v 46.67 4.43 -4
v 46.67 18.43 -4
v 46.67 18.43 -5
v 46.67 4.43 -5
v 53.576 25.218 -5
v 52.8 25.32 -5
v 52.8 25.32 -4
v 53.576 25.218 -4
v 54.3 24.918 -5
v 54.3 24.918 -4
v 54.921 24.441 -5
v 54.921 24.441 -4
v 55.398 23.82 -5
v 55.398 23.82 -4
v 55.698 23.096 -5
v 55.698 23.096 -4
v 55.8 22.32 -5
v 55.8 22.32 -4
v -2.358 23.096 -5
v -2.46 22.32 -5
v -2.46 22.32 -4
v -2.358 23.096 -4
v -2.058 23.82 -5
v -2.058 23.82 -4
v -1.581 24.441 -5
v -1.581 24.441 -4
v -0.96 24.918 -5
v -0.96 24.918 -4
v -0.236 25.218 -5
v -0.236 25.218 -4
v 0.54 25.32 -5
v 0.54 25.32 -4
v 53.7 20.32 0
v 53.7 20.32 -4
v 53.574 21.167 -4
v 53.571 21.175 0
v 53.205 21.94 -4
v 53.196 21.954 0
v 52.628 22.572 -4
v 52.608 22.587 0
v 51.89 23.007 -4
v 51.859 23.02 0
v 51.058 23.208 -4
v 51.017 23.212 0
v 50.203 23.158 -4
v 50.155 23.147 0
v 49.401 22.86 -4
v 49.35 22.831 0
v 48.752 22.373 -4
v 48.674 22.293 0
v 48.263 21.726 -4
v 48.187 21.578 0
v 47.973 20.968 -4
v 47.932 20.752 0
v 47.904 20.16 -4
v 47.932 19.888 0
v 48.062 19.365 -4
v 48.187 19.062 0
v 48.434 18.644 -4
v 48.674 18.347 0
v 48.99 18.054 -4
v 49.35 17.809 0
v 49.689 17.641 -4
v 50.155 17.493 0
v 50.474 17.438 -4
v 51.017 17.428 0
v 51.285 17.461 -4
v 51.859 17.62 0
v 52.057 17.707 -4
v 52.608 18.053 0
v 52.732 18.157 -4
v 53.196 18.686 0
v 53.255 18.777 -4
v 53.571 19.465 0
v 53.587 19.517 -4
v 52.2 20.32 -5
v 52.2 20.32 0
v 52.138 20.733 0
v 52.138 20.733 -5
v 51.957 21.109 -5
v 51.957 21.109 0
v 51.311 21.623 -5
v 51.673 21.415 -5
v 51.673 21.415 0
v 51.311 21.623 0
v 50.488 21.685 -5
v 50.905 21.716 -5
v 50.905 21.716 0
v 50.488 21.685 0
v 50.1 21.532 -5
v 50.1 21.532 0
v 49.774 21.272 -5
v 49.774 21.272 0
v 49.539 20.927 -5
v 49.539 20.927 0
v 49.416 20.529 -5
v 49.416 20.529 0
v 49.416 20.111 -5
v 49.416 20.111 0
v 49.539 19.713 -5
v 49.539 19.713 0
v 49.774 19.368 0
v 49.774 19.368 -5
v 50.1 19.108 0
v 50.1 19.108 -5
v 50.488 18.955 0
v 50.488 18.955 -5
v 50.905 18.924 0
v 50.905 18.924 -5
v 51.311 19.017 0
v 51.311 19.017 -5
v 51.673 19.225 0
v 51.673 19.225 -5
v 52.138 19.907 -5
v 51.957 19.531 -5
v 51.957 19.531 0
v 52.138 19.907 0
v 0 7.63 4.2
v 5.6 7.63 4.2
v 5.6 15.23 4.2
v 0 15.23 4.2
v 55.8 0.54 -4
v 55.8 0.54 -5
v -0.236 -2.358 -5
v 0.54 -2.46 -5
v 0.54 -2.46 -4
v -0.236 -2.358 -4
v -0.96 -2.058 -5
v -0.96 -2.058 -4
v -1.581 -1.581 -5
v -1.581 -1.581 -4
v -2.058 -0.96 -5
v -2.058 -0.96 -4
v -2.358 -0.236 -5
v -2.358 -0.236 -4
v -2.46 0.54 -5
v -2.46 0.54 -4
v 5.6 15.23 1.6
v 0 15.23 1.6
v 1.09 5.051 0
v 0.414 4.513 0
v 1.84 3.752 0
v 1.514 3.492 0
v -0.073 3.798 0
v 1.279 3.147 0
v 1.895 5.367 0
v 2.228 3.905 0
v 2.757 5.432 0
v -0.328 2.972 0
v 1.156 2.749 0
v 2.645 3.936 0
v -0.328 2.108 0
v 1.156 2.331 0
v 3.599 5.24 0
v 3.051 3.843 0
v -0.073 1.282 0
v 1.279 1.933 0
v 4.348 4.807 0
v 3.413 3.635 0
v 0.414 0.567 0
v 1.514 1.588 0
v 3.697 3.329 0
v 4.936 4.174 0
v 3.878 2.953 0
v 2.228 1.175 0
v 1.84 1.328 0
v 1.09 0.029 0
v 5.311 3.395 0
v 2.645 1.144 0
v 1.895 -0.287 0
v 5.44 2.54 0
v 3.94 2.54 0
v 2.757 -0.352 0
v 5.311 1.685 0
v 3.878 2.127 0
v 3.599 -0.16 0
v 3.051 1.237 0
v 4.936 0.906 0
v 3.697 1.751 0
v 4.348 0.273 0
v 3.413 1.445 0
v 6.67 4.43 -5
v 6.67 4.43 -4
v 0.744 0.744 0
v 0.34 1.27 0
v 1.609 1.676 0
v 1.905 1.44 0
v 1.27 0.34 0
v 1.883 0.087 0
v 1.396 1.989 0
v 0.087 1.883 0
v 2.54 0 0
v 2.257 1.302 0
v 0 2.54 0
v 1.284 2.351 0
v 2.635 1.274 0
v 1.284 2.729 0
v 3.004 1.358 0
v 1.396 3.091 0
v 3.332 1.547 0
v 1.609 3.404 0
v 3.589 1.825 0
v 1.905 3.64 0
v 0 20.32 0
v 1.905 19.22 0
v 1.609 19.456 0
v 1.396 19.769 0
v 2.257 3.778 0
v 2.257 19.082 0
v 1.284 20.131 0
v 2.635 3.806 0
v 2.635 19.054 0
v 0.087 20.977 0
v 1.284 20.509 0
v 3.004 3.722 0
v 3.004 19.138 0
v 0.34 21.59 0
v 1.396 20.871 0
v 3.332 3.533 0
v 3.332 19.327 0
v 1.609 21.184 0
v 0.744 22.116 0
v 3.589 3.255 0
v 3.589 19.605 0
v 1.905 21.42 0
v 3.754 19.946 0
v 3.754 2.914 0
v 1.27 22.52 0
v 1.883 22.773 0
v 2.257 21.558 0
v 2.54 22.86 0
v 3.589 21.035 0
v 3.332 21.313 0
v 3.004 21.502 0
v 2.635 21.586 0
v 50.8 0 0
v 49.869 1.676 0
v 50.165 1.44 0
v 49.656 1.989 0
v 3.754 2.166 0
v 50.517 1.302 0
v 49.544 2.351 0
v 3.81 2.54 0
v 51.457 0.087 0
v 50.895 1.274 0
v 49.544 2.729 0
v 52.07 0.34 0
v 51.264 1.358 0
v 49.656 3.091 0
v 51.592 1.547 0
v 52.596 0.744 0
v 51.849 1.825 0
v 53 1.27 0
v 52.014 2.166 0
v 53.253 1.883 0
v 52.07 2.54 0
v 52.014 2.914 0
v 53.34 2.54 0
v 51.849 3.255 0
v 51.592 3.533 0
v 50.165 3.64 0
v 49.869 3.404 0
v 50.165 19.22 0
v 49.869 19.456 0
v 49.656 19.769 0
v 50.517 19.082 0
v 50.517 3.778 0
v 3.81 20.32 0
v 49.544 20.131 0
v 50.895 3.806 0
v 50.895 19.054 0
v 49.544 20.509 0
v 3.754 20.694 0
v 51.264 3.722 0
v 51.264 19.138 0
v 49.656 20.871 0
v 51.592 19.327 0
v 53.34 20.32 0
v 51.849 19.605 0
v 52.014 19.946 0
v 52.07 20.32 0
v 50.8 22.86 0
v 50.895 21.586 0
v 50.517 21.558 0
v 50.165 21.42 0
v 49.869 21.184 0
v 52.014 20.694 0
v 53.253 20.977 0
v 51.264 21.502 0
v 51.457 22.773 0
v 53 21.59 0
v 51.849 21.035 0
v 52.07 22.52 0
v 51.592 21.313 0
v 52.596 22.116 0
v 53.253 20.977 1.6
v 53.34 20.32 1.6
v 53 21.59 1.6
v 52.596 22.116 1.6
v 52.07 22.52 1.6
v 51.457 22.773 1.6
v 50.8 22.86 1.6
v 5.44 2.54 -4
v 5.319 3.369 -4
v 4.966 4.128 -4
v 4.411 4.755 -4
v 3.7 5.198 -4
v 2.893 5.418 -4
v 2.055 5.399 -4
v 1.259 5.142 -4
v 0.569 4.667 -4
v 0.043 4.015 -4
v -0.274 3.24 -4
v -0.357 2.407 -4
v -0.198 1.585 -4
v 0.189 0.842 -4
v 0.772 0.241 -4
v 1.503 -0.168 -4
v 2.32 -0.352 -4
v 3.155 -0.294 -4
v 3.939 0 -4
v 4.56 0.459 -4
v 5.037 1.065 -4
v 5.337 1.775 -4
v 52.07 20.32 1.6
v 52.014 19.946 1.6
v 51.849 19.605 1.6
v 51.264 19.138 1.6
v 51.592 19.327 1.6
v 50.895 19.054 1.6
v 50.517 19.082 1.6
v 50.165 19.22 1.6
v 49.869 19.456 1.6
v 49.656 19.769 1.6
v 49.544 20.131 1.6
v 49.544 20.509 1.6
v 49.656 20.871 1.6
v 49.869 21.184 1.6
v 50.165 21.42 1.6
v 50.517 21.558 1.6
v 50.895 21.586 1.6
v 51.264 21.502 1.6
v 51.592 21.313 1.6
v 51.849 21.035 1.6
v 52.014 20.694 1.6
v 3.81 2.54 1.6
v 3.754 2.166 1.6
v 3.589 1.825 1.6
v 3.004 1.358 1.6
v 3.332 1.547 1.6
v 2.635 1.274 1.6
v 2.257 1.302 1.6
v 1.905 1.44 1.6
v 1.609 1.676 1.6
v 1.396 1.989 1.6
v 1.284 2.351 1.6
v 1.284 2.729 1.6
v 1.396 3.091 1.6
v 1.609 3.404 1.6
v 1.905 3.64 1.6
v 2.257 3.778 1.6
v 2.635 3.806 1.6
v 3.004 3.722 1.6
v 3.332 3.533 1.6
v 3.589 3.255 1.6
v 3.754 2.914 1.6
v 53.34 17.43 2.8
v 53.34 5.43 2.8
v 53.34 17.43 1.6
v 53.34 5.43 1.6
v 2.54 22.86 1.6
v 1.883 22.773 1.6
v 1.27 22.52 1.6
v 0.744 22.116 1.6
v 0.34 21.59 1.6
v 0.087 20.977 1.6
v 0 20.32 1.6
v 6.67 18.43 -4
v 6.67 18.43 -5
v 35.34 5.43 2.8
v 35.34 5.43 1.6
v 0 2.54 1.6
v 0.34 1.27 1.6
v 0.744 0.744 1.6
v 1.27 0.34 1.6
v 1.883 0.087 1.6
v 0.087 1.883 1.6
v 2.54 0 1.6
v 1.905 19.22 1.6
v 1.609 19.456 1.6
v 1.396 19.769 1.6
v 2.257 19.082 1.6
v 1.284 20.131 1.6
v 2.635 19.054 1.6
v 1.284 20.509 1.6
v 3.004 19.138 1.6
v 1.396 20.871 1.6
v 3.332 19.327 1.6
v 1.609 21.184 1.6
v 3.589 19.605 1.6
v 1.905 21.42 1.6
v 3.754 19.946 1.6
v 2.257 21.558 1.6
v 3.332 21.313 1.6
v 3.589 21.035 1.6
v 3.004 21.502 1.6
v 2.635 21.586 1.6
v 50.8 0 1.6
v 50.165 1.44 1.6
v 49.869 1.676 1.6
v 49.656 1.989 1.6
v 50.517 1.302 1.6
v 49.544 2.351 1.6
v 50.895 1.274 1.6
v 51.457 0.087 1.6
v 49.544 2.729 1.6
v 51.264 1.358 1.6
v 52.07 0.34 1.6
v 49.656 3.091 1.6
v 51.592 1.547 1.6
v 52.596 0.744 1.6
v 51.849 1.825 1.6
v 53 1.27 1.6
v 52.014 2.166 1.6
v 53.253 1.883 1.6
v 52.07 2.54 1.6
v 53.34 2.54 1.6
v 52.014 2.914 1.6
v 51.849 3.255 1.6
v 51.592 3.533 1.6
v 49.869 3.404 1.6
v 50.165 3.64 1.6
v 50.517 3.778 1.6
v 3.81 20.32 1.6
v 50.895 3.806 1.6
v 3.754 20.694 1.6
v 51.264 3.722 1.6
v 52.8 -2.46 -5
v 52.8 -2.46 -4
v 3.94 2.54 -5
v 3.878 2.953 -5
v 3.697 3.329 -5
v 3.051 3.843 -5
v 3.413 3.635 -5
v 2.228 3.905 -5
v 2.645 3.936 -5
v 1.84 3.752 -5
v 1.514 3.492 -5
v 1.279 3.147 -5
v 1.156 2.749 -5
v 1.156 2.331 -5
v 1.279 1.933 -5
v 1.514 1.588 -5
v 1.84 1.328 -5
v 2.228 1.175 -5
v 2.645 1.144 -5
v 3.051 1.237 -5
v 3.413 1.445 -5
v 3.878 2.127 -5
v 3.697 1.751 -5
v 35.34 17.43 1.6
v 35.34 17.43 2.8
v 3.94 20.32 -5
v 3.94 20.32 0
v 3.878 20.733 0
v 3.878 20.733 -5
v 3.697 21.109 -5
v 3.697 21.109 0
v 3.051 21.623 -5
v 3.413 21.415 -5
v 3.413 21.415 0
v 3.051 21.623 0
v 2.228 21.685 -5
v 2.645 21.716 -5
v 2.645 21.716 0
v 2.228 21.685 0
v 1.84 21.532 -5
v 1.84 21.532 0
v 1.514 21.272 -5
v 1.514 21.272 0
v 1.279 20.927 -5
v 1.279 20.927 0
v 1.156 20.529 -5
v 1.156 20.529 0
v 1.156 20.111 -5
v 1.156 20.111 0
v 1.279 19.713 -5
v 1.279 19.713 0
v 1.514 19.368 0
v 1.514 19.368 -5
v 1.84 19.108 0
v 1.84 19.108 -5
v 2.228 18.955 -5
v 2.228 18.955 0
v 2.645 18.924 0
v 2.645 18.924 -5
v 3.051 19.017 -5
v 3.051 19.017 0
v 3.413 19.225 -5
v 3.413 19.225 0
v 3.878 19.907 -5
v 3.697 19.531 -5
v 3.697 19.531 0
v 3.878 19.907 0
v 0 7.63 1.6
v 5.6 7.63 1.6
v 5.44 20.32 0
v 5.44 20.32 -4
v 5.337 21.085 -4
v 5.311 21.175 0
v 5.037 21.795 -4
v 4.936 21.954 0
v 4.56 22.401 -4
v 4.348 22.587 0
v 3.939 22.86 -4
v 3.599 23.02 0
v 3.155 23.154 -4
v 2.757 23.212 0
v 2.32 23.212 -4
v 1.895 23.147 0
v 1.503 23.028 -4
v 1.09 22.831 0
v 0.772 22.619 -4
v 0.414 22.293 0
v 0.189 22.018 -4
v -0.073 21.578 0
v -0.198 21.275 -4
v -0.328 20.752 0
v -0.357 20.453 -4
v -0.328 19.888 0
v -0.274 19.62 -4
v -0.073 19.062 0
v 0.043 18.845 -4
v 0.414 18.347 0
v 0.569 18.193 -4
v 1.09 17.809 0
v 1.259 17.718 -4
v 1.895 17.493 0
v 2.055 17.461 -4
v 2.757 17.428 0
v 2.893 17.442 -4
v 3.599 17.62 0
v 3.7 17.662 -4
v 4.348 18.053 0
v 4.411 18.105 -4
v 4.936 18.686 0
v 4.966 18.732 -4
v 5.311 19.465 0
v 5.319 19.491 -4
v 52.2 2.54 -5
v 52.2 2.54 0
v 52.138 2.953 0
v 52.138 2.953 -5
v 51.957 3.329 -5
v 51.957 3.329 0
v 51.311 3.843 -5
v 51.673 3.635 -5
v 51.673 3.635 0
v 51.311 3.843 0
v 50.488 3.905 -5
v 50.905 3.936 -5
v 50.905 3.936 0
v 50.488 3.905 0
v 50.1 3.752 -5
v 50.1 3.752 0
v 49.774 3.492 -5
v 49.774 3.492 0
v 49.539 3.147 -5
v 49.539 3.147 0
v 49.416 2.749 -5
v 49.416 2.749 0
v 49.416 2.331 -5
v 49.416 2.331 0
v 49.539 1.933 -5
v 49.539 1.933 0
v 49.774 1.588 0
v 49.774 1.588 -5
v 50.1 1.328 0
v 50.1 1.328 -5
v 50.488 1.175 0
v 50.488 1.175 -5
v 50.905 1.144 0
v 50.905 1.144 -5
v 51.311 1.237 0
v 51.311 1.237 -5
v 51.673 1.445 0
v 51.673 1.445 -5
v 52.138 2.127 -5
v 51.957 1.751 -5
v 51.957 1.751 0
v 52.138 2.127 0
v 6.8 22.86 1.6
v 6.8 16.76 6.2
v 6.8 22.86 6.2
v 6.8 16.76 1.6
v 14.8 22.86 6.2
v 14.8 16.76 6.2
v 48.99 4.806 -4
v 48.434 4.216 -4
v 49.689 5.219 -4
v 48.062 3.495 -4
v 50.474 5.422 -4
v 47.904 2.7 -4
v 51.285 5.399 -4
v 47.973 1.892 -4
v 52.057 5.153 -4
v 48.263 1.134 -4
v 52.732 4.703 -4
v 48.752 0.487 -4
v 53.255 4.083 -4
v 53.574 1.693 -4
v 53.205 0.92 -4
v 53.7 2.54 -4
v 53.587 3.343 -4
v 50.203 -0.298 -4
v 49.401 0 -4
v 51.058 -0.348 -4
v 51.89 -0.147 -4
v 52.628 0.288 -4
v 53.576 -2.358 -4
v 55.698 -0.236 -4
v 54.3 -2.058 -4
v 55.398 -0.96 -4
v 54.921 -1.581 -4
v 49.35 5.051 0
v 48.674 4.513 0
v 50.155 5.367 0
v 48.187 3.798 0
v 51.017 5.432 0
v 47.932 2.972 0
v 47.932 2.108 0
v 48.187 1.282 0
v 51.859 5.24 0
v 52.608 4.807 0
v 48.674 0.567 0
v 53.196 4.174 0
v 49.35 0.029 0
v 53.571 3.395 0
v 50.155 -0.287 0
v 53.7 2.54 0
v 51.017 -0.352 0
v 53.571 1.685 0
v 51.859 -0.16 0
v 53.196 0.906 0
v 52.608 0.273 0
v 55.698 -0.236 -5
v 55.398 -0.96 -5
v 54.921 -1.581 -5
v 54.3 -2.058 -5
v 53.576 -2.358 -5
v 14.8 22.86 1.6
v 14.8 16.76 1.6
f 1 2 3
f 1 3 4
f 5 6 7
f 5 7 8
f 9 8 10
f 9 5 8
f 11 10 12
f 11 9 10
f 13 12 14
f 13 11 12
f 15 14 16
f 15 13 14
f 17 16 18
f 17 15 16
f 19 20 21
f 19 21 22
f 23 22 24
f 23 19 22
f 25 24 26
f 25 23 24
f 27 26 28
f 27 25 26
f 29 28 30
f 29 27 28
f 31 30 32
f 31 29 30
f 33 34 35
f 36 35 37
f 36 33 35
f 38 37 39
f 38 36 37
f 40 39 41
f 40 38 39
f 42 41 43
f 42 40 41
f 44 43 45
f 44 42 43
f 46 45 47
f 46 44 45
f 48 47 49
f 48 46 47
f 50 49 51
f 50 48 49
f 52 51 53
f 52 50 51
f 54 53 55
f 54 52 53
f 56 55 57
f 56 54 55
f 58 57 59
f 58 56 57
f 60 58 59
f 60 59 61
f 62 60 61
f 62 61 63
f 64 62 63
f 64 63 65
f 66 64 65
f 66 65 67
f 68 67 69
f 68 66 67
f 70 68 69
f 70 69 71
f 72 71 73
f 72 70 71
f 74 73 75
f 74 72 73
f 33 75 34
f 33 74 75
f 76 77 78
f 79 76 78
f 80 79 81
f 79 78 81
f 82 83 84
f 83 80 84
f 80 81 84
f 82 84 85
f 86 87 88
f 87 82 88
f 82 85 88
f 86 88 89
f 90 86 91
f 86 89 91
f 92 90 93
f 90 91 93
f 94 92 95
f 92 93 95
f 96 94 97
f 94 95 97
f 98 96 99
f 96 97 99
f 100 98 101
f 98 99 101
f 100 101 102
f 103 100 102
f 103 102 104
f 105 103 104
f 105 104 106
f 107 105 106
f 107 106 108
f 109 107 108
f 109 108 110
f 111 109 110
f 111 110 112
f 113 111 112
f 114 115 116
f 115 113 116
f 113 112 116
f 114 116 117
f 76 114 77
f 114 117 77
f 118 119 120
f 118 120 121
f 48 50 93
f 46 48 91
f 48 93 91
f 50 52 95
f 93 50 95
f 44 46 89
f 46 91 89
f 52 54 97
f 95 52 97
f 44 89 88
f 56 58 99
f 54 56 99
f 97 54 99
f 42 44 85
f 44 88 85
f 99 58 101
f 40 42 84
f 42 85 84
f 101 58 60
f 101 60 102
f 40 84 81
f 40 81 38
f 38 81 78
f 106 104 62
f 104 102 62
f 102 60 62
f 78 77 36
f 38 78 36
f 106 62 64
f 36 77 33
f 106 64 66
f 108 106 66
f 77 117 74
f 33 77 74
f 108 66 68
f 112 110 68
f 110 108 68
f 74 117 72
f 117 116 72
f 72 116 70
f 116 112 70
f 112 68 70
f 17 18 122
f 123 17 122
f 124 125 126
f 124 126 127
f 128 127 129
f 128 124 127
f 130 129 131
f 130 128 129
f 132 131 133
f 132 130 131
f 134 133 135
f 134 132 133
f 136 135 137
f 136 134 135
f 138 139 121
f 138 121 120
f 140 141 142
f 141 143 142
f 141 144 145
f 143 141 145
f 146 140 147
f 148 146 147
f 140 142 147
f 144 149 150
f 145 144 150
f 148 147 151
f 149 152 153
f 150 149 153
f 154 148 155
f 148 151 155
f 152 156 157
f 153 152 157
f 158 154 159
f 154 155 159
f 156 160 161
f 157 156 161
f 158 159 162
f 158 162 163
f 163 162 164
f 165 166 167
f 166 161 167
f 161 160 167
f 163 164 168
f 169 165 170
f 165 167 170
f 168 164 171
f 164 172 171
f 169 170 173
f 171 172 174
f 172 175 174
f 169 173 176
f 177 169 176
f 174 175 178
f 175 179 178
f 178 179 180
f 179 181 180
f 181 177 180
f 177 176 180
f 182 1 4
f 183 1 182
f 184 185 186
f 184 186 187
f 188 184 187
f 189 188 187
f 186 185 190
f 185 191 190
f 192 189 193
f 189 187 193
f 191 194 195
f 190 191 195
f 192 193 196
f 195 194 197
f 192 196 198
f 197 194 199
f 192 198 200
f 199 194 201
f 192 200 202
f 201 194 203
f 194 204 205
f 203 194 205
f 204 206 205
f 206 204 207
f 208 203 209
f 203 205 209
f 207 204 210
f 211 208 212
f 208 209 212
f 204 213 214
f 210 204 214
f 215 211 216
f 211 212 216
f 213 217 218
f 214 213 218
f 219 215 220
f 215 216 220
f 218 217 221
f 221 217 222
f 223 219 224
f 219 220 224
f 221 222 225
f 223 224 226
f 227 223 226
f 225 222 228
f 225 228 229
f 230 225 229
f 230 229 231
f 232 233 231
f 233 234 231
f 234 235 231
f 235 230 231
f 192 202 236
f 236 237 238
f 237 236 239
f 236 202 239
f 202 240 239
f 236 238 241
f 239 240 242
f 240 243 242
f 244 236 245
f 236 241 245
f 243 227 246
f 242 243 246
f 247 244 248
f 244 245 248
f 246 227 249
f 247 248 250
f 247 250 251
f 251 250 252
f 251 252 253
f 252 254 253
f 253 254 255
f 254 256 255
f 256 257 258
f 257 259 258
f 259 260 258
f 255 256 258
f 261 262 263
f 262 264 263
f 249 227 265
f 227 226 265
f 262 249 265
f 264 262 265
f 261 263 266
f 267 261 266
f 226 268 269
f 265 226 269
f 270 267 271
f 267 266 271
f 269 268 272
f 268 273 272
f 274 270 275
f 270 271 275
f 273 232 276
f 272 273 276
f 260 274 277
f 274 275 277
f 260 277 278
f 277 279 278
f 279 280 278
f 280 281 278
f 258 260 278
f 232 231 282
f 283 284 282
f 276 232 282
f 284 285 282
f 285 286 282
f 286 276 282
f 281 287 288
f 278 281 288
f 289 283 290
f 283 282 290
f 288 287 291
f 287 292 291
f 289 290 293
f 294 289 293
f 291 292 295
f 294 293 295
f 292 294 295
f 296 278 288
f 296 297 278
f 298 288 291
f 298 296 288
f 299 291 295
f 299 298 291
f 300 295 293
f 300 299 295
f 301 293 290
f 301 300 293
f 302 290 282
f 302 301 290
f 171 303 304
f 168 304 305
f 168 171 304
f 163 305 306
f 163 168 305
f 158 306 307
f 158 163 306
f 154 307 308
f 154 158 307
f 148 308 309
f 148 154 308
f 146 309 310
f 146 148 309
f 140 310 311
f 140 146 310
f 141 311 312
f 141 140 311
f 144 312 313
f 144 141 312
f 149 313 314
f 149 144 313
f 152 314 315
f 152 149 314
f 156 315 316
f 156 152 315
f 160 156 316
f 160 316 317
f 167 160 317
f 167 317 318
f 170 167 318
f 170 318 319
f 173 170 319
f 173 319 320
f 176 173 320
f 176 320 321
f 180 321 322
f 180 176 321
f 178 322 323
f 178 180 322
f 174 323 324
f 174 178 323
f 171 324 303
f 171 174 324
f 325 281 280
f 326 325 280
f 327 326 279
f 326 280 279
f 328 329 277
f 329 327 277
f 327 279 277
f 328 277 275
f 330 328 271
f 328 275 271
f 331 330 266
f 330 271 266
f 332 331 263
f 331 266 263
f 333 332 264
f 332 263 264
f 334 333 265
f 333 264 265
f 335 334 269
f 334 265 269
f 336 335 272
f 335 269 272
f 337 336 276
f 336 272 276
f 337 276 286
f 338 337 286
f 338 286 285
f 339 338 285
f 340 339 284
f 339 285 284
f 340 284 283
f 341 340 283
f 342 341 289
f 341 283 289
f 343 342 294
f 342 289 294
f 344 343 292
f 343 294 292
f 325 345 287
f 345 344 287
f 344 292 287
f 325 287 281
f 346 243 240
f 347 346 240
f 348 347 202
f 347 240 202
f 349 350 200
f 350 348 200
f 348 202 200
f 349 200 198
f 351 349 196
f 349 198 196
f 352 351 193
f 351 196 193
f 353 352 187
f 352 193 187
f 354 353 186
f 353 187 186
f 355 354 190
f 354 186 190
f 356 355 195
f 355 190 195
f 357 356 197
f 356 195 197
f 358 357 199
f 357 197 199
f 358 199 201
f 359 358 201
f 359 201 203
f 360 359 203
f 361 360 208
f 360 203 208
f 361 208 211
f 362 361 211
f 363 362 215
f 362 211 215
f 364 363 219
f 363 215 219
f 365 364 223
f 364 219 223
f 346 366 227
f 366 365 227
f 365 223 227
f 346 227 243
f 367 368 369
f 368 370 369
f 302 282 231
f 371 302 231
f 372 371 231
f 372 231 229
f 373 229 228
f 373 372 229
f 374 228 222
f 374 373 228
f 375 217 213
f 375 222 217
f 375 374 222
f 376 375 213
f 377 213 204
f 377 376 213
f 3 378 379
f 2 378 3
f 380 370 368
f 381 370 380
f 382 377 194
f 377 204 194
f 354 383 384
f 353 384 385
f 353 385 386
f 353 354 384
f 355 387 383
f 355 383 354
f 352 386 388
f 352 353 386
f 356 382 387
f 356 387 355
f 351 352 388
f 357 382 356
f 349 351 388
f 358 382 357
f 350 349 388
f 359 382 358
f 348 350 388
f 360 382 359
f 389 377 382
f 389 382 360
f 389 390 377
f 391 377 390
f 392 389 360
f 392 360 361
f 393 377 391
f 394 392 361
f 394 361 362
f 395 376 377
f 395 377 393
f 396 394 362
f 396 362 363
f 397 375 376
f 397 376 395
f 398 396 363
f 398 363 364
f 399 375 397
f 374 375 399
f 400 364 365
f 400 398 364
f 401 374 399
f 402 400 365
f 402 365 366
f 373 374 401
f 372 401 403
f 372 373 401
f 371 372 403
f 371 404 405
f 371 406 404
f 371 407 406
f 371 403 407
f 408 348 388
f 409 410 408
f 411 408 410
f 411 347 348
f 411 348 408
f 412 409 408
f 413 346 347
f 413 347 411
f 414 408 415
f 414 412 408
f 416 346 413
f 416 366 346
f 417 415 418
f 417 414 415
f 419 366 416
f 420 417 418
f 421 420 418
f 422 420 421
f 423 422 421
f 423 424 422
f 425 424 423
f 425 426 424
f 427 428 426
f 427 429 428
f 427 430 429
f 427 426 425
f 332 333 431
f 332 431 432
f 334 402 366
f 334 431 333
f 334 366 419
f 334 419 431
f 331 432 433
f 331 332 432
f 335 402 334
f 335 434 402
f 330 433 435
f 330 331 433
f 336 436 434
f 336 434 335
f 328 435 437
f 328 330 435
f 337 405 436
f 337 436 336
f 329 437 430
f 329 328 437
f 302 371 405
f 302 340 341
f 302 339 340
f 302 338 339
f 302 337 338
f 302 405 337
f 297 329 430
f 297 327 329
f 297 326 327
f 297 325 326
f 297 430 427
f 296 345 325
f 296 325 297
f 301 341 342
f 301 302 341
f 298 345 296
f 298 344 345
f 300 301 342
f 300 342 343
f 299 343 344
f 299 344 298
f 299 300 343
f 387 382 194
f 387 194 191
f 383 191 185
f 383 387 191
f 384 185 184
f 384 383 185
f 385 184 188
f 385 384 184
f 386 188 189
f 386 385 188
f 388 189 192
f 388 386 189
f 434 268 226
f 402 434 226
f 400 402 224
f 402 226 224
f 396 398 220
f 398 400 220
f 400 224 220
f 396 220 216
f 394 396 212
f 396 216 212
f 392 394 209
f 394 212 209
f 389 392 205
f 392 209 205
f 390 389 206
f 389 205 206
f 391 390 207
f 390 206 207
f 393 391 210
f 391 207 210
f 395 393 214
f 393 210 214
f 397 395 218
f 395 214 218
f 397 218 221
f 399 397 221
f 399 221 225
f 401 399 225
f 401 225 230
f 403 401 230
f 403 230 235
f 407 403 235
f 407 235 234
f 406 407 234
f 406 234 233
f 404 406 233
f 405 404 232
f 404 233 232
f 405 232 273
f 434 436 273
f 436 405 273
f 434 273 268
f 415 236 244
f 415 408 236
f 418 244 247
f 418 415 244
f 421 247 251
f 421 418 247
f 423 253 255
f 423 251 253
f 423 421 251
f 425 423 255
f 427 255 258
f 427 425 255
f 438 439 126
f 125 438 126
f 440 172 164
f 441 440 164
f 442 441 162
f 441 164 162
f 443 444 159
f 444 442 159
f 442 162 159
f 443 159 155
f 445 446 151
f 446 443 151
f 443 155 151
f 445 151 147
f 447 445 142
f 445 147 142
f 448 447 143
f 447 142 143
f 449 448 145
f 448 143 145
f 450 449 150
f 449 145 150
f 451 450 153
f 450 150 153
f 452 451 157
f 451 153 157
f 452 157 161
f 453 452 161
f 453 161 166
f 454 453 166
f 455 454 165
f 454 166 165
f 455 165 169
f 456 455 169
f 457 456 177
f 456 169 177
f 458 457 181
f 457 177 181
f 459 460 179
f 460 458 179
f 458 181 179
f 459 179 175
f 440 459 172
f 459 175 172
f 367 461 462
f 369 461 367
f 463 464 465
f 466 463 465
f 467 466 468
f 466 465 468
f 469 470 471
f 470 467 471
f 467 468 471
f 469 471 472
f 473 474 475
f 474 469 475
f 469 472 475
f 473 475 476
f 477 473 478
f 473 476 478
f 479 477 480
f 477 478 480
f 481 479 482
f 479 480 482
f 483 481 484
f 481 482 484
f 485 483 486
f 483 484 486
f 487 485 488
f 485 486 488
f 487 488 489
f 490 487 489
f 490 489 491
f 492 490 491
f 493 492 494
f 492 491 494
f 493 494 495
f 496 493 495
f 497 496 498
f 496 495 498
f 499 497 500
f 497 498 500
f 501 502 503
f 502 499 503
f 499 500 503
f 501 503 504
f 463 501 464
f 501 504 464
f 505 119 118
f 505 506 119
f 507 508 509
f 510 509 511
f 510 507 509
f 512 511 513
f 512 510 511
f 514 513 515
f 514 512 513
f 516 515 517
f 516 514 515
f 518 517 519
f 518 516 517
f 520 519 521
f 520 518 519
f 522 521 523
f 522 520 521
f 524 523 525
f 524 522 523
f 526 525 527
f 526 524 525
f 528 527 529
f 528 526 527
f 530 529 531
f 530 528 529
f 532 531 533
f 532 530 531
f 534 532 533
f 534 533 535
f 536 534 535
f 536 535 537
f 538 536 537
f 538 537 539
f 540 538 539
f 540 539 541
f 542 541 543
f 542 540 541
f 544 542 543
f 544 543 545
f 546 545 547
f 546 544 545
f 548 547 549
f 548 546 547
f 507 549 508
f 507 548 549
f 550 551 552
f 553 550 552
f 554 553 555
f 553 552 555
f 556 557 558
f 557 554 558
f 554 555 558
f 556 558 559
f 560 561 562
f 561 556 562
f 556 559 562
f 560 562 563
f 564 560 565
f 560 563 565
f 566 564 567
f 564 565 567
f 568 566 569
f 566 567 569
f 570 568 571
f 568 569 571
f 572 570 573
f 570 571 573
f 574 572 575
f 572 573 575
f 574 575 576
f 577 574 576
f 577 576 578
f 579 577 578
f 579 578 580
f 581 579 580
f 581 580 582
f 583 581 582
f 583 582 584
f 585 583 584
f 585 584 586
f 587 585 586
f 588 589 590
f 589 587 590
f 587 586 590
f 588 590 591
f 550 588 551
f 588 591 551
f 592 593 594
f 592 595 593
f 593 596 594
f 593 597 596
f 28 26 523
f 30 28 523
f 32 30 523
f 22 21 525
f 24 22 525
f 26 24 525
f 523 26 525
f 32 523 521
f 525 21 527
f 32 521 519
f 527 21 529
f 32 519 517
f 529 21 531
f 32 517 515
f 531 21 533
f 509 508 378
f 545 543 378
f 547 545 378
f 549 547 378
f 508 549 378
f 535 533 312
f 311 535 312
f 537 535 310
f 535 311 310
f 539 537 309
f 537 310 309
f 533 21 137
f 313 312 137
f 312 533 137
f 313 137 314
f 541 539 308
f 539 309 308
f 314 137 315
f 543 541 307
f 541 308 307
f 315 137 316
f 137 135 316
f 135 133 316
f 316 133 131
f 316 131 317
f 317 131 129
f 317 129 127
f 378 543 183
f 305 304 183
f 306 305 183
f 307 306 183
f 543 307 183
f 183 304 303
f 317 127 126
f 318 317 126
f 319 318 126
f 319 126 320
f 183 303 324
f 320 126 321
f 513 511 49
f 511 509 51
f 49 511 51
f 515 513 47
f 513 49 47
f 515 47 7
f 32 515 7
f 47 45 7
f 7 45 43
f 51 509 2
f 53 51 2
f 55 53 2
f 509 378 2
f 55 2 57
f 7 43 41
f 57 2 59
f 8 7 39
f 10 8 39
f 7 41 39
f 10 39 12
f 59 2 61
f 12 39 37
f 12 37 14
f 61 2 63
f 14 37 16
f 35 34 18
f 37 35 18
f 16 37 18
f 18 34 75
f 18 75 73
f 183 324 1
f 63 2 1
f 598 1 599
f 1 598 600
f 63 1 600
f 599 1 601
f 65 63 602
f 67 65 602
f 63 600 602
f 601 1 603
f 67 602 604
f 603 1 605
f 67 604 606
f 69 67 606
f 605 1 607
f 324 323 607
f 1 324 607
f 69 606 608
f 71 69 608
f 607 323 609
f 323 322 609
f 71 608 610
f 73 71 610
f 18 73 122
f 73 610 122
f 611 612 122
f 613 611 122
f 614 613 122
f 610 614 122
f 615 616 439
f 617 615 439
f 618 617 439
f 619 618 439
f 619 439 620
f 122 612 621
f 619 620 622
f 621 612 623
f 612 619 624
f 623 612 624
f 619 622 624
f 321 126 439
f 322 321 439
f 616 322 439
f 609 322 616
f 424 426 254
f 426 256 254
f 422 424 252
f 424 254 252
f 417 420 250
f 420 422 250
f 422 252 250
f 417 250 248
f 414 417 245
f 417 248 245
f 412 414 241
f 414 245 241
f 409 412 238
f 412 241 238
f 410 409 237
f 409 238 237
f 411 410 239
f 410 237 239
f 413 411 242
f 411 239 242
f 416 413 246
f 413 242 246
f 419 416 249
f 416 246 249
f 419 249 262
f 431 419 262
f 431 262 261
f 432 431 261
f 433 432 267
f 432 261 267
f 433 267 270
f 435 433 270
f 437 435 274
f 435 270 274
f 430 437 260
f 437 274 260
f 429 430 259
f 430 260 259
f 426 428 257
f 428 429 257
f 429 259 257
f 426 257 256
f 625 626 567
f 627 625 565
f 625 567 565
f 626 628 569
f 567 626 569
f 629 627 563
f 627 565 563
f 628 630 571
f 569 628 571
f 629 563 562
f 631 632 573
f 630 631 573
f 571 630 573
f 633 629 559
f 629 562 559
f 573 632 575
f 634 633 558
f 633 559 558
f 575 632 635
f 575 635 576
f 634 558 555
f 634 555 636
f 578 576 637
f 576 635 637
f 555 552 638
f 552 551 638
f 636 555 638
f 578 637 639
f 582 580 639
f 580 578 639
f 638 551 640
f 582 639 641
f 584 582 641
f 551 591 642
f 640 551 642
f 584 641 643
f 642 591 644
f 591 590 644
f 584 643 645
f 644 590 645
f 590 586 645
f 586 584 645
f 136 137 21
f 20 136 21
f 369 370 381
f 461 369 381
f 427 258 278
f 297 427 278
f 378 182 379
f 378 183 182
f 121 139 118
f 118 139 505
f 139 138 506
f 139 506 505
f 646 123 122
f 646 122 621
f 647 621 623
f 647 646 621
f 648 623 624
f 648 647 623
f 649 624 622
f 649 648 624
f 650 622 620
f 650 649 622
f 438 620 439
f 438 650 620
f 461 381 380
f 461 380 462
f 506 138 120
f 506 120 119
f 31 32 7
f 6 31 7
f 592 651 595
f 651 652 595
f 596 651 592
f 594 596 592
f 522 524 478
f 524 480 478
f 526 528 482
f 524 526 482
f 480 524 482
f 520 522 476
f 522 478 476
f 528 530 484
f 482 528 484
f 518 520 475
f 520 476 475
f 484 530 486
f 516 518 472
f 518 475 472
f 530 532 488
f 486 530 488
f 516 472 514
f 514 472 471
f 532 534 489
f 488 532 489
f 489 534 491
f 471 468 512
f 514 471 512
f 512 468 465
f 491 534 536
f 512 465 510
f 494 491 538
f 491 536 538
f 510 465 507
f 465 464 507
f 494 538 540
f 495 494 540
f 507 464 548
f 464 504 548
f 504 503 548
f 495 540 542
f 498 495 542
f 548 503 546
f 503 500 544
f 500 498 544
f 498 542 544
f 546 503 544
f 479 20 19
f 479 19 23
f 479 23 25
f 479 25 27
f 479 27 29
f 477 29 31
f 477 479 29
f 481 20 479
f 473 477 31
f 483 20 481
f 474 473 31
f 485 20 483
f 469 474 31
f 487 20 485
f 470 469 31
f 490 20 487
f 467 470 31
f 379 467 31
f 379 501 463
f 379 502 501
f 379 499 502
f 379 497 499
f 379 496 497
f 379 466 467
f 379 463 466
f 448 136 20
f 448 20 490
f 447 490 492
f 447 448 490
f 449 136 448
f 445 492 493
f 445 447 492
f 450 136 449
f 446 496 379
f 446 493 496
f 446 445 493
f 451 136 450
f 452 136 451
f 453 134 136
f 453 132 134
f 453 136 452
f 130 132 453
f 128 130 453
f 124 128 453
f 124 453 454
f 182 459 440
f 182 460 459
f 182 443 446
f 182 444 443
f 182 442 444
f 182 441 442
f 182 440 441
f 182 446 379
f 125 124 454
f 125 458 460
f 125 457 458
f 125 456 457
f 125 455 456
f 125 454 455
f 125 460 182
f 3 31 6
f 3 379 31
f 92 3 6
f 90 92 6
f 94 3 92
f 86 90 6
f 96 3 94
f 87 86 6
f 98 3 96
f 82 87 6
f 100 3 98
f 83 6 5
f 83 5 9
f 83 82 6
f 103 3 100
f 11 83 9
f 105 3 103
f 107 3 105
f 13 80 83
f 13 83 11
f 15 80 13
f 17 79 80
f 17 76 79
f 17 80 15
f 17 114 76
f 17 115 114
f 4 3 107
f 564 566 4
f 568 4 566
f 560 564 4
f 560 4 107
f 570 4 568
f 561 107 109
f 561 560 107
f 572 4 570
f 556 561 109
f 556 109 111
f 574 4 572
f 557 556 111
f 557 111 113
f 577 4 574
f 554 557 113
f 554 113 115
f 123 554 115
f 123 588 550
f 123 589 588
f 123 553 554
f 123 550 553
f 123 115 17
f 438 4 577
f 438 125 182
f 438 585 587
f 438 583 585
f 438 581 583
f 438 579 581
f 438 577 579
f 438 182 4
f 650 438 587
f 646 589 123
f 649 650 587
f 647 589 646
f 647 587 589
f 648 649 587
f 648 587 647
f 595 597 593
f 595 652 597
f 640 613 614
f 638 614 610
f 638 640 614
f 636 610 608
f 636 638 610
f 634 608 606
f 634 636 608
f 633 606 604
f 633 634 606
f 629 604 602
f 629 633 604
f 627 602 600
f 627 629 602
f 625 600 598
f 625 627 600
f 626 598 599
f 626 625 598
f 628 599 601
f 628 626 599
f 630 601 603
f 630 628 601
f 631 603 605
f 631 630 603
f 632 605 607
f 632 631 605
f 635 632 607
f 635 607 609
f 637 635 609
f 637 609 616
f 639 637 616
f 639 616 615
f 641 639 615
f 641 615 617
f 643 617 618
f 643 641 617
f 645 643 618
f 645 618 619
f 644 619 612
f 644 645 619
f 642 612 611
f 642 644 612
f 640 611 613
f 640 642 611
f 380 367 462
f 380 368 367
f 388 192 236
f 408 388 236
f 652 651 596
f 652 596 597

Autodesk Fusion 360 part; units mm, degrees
sketch "board" plane through (0, 0, 0) normal (0, 0, 1) x (1, 0, 0)
  line L0 (0, 0) -> (53.34, 0)
  line L1 (53.34, 0) -> (53.34, 22.86)
  line L2 (53.34, 22.86) -> (0, 22.86)
  line L3 (0, 22.86) -> (0, 0)
  circle A0 centre (2.54, 20.32) radius 1.27
  circle A1 centre (50.8, 20.32) radius 1.27
  circle A2 centre (2.54, 2.54) radius 1.27
  circle A3 centre (50.8, 2.54) radius 1.27
  dimension "d1" = 53.34
  dimension "d2" = 22.86
  dimension "d3" = 2.54
  dimension "d4" = 2.54
  dimension "d5" = 2.54
  dimension "d8" = 48.26
  dimension "d9" = -17.78
extrude "Extrude1" add sketch "board" along normal blind 1.6 makes body 1
fillet "Fillet1" radius 2.54 4 edges at (0, 22.86, 0.8) (0, 0, 0.8) (53.34, 22.86, 0.8) (53.34, 0, 0.8) on bodies 1
sketch "usb" plane through (0, 0, 1.6) normal (0, 0, 1) x (-1, 0, 0)
  circle A0 centre (-50.8, -20.32) radius 1.27
  circle A1 centre (-50.8, -2.54) radius 1.27
  circle A2 centre (-2.54, -2.54) radius 1.27
  circle A3 centre (-2.54, -20.32) radius 1.27
  arc A4 (-50.8, 0) -> (-53.34, -2.54) centre (-50.8, -2.54) ccw
  line L0 (-53.34, -2.54) -> (-53.34, -20.32)
  arc A5 (-53.34, -20.32) -> (-50.8, -22.86) centre (-50.8, -20.32) ccw
  line L1 (-50.8, -22.86) -> (-2.54, -22.86)
  arc A6 (-2.54, -22.86) -> (0, -20.32) centre (-2.54, -20.32) ccw
  line L2 (0, -20.32) -> (0, -2.54)
  arc A7 (0, -2.54) -> (-2.54, 0) centre (-2.54, -2.54) ccw
  line L3 (-2.54, 0) -> (-50.8, 0)
  line L4 (0, -11.43) -> (-53.34, -11.43) construction
  line L5 (-26.67, -22.86) -> (-26.67, 0) construction
  line L6 (0, -15.23) -> (-5.6, -15.23)
  line L7 (-5.6, -15.23) -> (-5.6, -7.63)
  line L8 (-5.6, -7.63) -> (0, -7.63)
  line L9 (0, -7.63) -> (0, -15.23)
  line L10 (0, -11.43) -> (-5.6, -11.43) construction
  dimension "d13" = 7.6
  dimension "d14" = 5.6
extrude "Extrude2" add sketch "usb" along normal blind 2.6 separate body contours L2 L6 L7 L8 L9 makes body 2
sketch "jst" plane through (0, 0, 1.6) normal (0, 0, 1) x (-1, 0, 0)
  circle A0 centre (-50.8, -20.32) radius 1.27
  circle A1 centre (-50.8, -2.54) radius 1.27
  circle A2 centre (-2.54, -2.54) radius 1.27
  circle A3 centre (-2.54, -20.32) radius 1.27
  arc A4 (-50.8, 0) -> (-53.34, -2.54) centre (-50.8, -2.54) ccw
  line L0 (-53.34, -2.54) -> (-53.34, -20.32)
  arc A5 (-53.34, -20.32) -> (-50.8, -22.86) centre (-50.8, -20.32) ccw
  line L1 (-50.8, -22.86) -> (-2.54, -22.86)
  arc A6 (-2.54, -22.86) -> (0, -20.32) centre (-2.54, -20.32) ccw
  line L2 (0, -20.32) -> (0, -2.54)
  arc A7 (0, -2.54) -> (-2.54, 0) centre (-2.54, -2.54) ccw
  line L3 (-2.54, 0) -> (-50.8, 0)
  line L4 (-6.8, -22.86) -> (-14.8, -22.86)
  line L5 (-14.8, -22.86) -> (-14.8, -16.76)
  line L6 (-14.8, -16.76) -> (-6.8, -16.76)
  line L7 (-6.8, -16.76) -> (-6.8, -22.86)
  dimension "d17" = 6.1
  dimension "d18" = 8
  dimension "d19" = 6.8
extrude "Extrude3" add sketch "jst" along normal blind 4.6 separate body contours L1 L4 L5 L6 L7 makes body 3
sketch "wifi" plane through (0, 0, 1.6) normal (0, 0, 1) x (-1, 0, 0)
  circle A0 centre (-50.8, -20.32) radius 1.27
  circle A1 centre (-50.8, -2.54) radius 1.27
  circle A2 centre (-2.54, -2.54) radius 1.27
  circle A3 centre (-2.54, -20.32) radius 1.27
  arc A4 (-50.8, 0) -> (-53.34, -2.54) centre (-50.8, -2.54) ccw
  line L0 (-53.34, -2.54) -> (-53.34, -20.32)
  arc A5 (-53.34, -20.32) -> (-50.8, -22.86) centre (-50.8, -20.32) ccw
  line L1 (-50.8, -22.86) -> (-2.54, -22.86)
  arc A6 (-2.54, -22.86) -> (0, -20.32) centre (-2.54, -20.32) ccw
  line L2 (0, -20.32) -> (0, -2.54)
  arc A7 (0, -2.54) -> (-2.54, 0) centre (-2.54, -2.54) ccw
  line L3 (-2.54, 0) -> (-50.8, 0)
  line L4 (-35.34, -17.43) -> (-53.34, -17.43)
  line L5 (-53.34, -17.43) -> (-53.34, -5.43)
  line L6 (-53.34, -5.43) -> (-35.34, -5.43)
  line L7 (-35.34, -5.43) -> (-35.34, -17.43)
  line L8 (-35.34, -11.43) -> (-53.34, -11.43) construction
  line L9 (-53.34, -11.43) -> (0, -11.43) construction
  dimension "d22" = 18
  dimension "d23" = 12
extrude "Extrude4" add sketch "wifi" along normal blind 1.2 separate body contours L0 L4 L5 L6 L7 makes body 4
sketch "Sketch1" plane through (0, 0, 0) normal (0, 0, -1) x (1, 0, 0) in component "board tester"
  arc A0 (53.34, -2.54) -> (50.8, 0) centre (50.8, -2.54) ccw construction
  line L0 (50.8, 0) -> (2.54, 0)
  arc A1 (2.54, 0) -> (0, -2.54) centre (2.54, -2.54) ccw construction
  line L1 (0, -2.54) -> (0, -20.32) construction
  arc A2 (0, -20.32) -> (2.54, -22.86) centre (2.54, -20.32) ccw
  line L2 (2.54, -22.86) -> (50.8, -22.86)
  arc A3 (50.8, -22.86) -> (53.34, -20.32) centre (50.8, -20.32) ccw
  line L3 (53.34, -20.32) -> (53.34, -2.54) construction
  circle A4 centre (50.8, -20.32) radius 1.27
  circle A5 centre (50.8, -2.54) radius 1.27 construction
  circle A6 centre (2.54, -2.54) radius 1.27
  circle A7 centre (2.54, -20.32) radius 1.27
  circle A8 centre (50.8, -2.54) radius 2.9
  circle A9 centre (50.8, -2.54) radius 1.4
  circle A10 centre (2.54, -2.54) radius 1.4
  circle A11 centre (2.54, -2.54) radius 2.9
  circle A12 centre (50.8, -20.32) radius 1.4
  circle A13 centre (50.8, -20.32) radius 2.9
  circle A14 centre (2.54, -20.32) radius 1.4
  circle A15 centre (2.54, -20.32) radius 2.9
  line L4 (26.67, -22.86) -> (26.67, 0) construction
  line L5 (0, -11.43) -> (53.34, -11.43) construction
  line L6 (-2.46, -25.32) -> (55.8, -25.32)
  line L7 (55.8, -25.32) -> (55.8, 2.46)
  line L8 (55.8, 2.46) -> (-2.46, 2.46)
  line L9 (-2.46, 2.46) -> (-2.46, -25.32)
  line L10 (-2.46, -25.32) -> (55.8, 2.46) construction
  line L11 (55.8, -25.32) -> (-2.46, 2.46) construction
  line L12 (6.67, -18.43) -> (46.67, -18.43)
  line L13 (46.67, -18.43) -> (46.67, -4.43)
  line L14 (46.67, -4.43) -> (6.67, -4.43)
  line L15 (6.67, -4.43) -> (6.67, -18.43)
  line L16 (6.67, -18.43) -> (46.67, -4.43) construction
  line L17 (46.67, -18.43) -> (6.67, -4.43) construction
  point P0 (26.67, -11.43)
  point P1 (26.67, -11.43)
  dimension "d27" = 2.8
  dimension "d28" = 1.5
  dimension "d31" = -48.26
  dimension "d32" = -17.78
  dimension "d33" = 5
  dimension "d34" = 5
  dimension "d35" = 40
  dimension "d36" = 14
extrude "Extrude1'" add sketch "Sketch1" along normal blind 5 and the other way blind -4 separate body contours A11 | A8 | A13 | A15 | L6 L7 L8 L9 makes body 5 in component "board tester"
extrude "Extrude2'" add sketch "Sketch1" along normal blind 5 and the other way blind 0 contours A11 | A8 | A13 | A15 bodies 5 in component "board tester"
fillet "Fillet1'" radius 3 4 edges at (-2.46, -2.46, -4.5) (-2.46, 25.32, -4.5) (55.8, 25.32, -4.5) (55.8, -2.46, -4.5) on bodies 5 in component "board tester"
component "board tester" placed x (1, 0, 0) y (0, 1, 0) z (0, 0, 1) at (0, 0, 0)
